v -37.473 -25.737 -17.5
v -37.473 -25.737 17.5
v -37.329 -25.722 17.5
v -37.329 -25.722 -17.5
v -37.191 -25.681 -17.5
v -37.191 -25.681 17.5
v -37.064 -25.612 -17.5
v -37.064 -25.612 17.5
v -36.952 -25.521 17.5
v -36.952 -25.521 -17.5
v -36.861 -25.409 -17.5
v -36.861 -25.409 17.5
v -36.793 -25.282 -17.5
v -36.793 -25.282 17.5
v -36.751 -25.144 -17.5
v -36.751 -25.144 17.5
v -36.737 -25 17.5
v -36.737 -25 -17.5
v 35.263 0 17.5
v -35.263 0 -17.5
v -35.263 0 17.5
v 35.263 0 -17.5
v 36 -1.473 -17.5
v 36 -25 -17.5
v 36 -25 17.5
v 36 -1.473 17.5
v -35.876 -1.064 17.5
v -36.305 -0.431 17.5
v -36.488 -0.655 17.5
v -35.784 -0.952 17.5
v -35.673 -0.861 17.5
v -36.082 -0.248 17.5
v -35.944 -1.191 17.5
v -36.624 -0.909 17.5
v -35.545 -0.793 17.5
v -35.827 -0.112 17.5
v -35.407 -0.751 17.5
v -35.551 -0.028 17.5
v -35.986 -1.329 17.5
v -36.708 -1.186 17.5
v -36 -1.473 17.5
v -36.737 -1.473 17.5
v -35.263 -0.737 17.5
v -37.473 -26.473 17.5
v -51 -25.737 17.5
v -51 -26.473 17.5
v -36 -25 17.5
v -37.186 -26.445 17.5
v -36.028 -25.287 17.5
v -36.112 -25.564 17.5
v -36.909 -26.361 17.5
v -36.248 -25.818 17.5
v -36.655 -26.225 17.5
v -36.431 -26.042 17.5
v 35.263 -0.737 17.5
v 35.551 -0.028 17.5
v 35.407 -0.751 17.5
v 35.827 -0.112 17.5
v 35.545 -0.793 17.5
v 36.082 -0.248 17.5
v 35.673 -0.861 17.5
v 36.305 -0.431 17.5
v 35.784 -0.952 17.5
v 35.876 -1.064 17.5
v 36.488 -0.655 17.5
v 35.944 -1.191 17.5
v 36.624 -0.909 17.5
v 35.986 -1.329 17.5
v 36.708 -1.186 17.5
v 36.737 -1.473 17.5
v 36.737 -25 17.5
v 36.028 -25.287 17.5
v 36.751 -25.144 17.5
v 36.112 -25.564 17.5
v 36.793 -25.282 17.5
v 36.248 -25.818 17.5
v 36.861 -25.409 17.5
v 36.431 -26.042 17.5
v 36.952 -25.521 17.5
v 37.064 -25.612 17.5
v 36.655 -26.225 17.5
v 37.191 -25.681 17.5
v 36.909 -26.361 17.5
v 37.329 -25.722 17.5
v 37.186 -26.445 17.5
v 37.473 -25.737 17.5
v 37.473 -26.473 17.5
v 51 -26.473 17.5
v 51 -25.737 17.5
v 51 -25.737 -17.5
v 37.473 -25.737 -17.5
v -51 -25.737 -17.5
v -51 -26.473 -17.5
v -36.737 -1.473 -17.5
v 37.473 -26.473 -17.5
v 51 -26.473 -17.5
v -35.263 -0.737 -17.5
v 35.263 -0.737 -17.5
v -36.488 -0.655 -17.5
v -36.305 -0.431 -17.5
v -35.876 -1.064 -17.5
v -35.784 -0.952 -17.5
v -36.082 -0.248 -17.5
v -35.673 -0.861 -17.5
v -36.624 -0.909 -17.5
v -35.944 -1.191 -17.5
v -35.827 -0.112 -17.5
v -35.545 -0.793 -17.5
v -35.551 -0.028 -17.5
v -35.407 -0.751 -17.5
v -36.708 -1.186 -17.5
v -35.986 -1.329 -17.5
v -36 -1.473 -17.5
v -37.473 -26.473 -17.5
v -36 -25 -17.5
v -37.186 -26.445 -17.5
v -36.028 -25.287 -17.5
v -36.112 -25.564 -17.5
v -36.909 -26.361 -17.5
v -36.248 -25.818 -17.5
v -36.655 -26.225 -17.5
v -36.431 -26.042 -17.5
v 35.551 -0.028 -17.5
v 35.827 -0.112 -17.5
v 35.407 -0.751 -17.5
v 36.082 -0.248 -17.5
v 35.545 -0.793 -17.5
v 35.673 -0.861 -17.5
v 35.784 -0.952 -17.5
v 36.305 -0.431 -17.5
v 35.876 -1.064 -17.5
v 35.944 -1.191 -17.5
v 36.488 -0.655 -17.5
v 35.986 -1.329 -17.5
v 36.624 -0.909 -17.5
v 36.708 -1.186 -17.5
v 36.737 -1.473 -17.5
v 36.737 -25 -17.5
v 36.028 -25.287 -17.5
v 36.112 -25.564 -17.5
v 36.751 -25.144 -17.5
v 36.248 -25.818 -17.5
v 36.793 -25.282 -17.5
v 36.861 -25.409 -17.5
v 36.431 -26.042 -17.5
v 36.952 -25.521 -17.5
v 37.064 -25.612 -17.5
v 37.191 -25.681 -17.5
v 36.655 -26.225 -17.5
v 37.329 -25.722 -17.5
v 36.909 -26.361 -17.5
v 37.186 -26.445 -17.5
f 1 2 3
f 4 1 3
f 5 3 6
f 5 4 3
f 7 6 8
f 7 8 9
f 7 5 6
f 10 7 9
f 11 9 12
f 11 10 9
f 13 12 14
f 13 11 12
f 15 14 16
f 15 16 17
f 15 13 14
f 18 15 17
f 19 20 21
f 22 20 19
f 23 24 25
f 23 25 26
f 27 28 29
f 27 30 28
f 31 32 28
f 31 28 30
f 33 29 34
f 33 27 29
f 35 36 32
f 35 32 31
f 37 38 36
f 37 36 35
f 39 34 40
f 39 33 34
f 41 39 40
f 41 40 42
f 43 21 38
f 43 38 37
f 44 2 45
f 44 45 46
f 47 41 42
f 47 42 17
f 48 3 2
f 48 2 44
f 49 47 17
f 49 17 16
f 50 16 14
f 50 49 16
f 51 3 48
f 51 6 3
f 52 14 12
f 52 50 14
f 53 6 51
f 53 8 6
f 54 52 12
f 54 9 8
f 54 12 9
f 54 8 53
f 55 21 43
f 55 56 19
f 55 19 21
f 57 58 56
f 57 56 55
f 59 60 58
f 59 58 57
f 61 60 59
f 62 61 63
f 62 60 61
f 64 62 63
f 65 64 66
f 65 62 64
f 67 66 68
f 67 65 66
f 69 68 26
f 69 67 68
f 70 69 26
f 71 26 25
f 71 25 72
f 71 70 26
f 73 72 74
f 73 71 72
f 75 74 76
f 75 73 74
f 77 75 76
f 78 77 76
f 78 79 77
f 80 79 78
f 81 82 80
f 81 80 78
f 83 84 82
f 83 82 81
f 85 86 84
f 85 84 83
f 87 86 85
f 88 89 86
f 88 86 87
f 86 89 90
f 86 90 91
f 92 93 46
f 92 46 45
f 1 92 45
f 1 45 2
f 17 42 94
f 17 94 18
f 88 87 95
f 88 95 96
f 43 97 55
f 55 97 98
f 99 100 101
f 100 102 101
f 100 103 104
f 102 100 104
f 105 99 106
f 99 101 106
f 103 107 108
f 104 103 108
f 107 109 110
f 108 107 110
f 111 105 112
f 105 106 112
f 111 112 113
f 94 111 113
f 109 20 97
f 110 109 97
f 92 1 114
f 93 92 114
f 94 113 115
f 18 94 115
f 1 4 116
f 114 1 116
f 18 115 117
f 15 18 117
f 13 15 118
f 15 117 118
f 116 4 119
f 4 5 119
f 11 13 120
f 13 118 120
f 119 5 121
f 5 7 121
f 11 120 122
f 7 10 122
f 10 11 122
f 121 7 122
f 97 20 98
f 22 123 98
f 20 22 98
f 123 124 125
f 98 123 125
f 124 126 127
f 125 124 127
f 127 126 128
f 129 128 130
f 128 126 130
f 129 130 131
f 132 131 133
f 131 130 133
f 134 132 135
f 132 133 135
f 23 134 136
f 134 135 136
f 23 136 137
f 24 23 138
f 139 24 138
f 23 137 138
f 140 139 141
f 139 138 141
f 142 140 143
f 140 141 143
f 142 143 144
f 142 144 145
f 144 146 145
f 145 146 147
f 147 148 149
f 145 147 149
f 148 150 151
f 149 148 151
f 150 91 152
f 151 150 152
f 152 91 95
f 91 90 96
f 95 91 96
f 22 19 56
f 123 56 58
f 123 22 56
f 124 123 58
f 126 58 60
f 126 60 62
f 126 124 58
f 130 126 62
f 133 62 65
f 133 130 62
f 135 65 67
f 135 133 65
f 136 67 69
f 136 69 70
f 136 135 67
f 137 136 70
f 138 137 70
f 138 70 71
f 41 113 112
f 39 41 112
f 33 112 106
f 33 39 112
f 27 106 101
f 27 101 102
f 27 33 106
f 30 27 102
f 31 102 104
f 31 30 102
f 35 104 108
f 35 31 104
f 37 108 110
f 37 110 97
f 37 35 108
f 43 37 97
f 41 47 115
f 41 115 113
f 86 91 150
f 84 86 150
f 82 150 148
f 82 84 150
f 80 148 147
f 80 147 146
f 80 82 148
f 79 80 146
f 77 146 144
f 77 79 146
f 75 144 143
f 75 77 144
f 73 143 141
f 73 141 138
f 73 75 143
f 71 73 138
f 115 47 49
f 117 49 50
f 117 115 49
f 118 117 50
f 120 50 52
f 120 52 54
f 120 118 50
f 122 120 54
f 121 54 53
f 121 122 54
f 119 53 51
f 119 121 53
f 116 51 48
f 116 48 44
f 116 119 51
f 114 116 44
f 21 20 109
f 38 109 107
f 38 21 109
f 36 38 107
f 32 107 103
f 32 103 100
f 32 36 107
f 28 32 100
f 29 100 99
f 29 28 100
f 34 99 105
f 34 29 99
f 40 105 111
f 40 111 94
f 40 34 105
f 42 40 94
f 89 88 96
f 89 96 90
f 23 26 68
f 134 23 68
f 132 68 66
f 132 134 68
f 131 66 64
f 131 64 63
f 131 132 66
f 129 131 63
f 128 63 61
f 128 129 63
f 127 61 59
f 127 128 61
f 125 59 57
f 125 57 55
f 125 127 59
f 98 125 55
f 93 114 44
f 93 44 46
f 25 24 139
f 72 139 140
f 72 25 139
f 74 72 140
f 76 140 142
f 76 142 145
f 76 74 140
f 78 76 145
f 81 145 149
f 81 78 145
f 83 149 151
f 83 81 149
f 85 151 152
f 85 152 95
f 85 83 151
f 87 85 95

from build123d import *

# Parameters (mm, degrees)
SKETCH1_W                      = 72
SKETCH1_H                      = 35
BASE_FLANGE1_DEPTH             = 0.7366
EDGE_FLANGE1_STRIP_W           = 4.4196
EDGE_FLANGE1_STRIP_H           = 0.7366
EDGE_FLANGE1_STRIP_CUT_DEPTH   = 35
EDGE_FLANGE1_STRIP_2_W         = 4.4196
EDGE_FLANGE1_STRIP_2_H         = 0.7366
EDGE_FLANGE1_STRIP_CUT_2_DEPTH = 35
EDGE_FLANGE1_DEPTH             = 35
EDGE_FLANGE1_BEND_DEPTH        = 35
EDGE_FLANGE2_STRIP_W           = 4.4196
EDGE_FLANGE2_STRIP_H           = 0.7366
EDGE_FLANGE2_STRIP_CUT_DEPTH   = 35
EDGE_FLANGE2_STRIP_2_W         = 4.4196
EDGE_FLANGE2_STRIP_2_H         = 0.7366
EDGE_FLANGE2_STRIP_CUT_2_DEPTH = 35
EDGE_FLANGE2_DEPTH             = 35
EDGE_FLANGE2_BEND_DEPTH        = 35


# Sheet-metal steps are written as plain solids
with BuildPart() as part:
    # Sketch1 → Base-Flange1 (new body)
    with BuildSketch(Plane(origin=(0, 0, 0), x_dir=(1, 0, 0), z_dir=(0, 1, 0))):
        Rectangle(SKETCH1_W, SKETCH1_H)
    extrude(amount=-BASE_FLANGE1_DEPTH)

    # Edge-Flange1 strip (across the edge) → Edge-Flange1 strip cut (cut)
    with BuildSketch(Plane(origin=(36, -0.7366, -17.5), x_dir=(-1, 0, 0), z_dir=(0, 0, 1))):
        with Locations((-1.4732, -0.3683)):
            Rectangle(EDGE_FLANGE1_STRIP_W, EDGE_FLANGE1_STRIP_H)
    extrude(amount=EDGE_FLANGE1_STRIP_CUT_DEPTH, mode=Mode.SUBTRACT)

    # Edge-Flange1 strip 2 (across the edge) → Edge-Flange1 strip cut 2 (cut)
    with BuildSketch(Plane(origin=(-36, -0.7366, 17.5), x_dir=(1, 0, 0), z_dir=(0, 0, -1))):
        with Locations((-1.4732, -0.3683)):
            Rectangle(EDGE_FLANGE1_STRIP_2_W, EDGE_FLANGE1_STRIP_2_H)
    extrude(amount=EDGE_FLANGE1_STRIP_CUT_2_DEPTH, mode=Mode.SUBTRACT)

    # Edge-Flange1 section (across the edge) → Edge-Flange1 (add)
    with BuildSketch(Plane(origin=(36, -0.7366, -17.5), x_dir=(-1, 0, 0), z_dir=(0, 0, 1))):
        with BuildLine():
            Line((-0.7366, 0.7366), (-0.7366, 25))
            Line((-0.7366, 25), (0, 25))
            Line((0, 25), (0, 0.7366))
            ThreePointArc((0, 0.7366), (0.215745145, 0.215745145), (0.7366, 0))
            Line((0.7366, 0), (0.7366, -0.7366))
            ThreePointArc((0.7366, -0.7366), (-0.30510971, -0.30510971), (-0.7366, 0.7366))
        make_face()
    extrude(amount=EDGE_FLANGE1_DEPTH)

    # Edge-Flange1 section 2 (across the edge) → Edge-Flange1 bend (add)
    with BuildSketch(Plane(origin=(-36, -0.7366, 17.5), x_dir=(1, 0, 0), z_dir=(0, 0, -1))):
        with BuildLine():
            Line((-0.7366, 0.7366), (-0.7366, 25))
            Line((-0.7366, 25), (0, 25))
            Line((0, 25), (0, 0.7366))
            ThreePointArc((0, 0.7366), (0.215745145, 0.215745145), (0.7366, 0))
            Line((0.7366, 0), (0.7366, -0.7366))
            ThreePointArc((0.7366, -0.7366), (-0.30510971, -0.30510971), (-0.7366, 0.7366))
        make_face()
    extrude(amount=EDGE_FLANGE1_BEND_DEPTH)

    # Edge-Flange2 strip (across the edge) → Edge-Flange2 strip cut (cut)
    with BuildSketch(Plane(origin=(-36.7366, -25.7366, -17.5), x_dir=(0, 1, 0), z_dir=(0, 0, 1))):
        with Locations((-1.4732, -0.3683)):
            Rectangle(EDGE_FLANGE2_STRIP_W, EDGE_FLANGE2_STRIP_H)
    extrude(amount=EDGE_FLANGE2_STRIP_CUT_DEPTH, mode=Mode.SUBTRACT)

    # Edge-Flange2 strip 2 (across the edge) → Edge-Flange2 strip cut 2 (cut)
    with BuildSketch(Plane(origin=(36.7366, -25.7366, 17.5), x_dir=(0, 1, 0), z_dir=(0, 0, -1))):
        with Locations((-1.4732, -0.3683)):
            Rectangle(EDGE_FLANGE2_STRIP_2_W, EDGE_FLANGE2_STRIP_2_H)
    extrude(amount=EDGE_FLANGE2_STRIP_CUT_2_DEPTH, mode=Mode.SUBTRACT)

    # Edge-Flange2 section (across the edge) → Edge-Flange2 (add)
    with BuildSketch(Plane(origin=(-36.7366, -25.7366, -17.5), x_dir=(0, 1, 0), z_dir=(0, 0, 1))):
        with BuildLine():
            Line((-0.7366, 0.7366), (-0.7366, 14.2634))
            Line((-0.7366, 14.2634), (0, 14.2634))
            Line((0, 14.2634), (0, 0.7366))
            ThreePointArc((0, 0.7366), (0.215745145, 0.215745145), (0.7366, 0))
            Line((0.7366, 0), (0.7366, -0.7366))
            ThreePointArc((0.7366, -0.7366), (-0.30510971, -0.30510971), (-0.7366, 0.7366))
        make_face()
    extrude(amount=EDGE_FLANGE2_DEPTH)

    # Edge-Flange2 section 2 (across the edge) → Edge-Flange2 bend (add)
    with BuildSketch(Plane(origin=(36.7366, -25.7366, 17.5), x_dir=(0, 1, 0), z_dir=(0, 0, -1))):
        with BuildLine():
            Line((-0.7366, 0.7366), (-0.7366, 14.2634))
            Line((-0.7366, 14.2634), (0, 14.2634))
            Line((0, 14.2634), (0, 0.7366))
            ThreePointArc((0, 0.7366), (0.215745145, 0.215745145), (0.7366, 0))
            Line((0.7366, 0), (0.7366, -0.7366))
            ThreePointArc((0.7366, -0.7366), (-0.30510971, -0.30510971), (-0.7366, 0.7366))
        make_face()
    extrude(amount=EDGE_FLANGE2_BEND_DEPTH)


solid = part.part
